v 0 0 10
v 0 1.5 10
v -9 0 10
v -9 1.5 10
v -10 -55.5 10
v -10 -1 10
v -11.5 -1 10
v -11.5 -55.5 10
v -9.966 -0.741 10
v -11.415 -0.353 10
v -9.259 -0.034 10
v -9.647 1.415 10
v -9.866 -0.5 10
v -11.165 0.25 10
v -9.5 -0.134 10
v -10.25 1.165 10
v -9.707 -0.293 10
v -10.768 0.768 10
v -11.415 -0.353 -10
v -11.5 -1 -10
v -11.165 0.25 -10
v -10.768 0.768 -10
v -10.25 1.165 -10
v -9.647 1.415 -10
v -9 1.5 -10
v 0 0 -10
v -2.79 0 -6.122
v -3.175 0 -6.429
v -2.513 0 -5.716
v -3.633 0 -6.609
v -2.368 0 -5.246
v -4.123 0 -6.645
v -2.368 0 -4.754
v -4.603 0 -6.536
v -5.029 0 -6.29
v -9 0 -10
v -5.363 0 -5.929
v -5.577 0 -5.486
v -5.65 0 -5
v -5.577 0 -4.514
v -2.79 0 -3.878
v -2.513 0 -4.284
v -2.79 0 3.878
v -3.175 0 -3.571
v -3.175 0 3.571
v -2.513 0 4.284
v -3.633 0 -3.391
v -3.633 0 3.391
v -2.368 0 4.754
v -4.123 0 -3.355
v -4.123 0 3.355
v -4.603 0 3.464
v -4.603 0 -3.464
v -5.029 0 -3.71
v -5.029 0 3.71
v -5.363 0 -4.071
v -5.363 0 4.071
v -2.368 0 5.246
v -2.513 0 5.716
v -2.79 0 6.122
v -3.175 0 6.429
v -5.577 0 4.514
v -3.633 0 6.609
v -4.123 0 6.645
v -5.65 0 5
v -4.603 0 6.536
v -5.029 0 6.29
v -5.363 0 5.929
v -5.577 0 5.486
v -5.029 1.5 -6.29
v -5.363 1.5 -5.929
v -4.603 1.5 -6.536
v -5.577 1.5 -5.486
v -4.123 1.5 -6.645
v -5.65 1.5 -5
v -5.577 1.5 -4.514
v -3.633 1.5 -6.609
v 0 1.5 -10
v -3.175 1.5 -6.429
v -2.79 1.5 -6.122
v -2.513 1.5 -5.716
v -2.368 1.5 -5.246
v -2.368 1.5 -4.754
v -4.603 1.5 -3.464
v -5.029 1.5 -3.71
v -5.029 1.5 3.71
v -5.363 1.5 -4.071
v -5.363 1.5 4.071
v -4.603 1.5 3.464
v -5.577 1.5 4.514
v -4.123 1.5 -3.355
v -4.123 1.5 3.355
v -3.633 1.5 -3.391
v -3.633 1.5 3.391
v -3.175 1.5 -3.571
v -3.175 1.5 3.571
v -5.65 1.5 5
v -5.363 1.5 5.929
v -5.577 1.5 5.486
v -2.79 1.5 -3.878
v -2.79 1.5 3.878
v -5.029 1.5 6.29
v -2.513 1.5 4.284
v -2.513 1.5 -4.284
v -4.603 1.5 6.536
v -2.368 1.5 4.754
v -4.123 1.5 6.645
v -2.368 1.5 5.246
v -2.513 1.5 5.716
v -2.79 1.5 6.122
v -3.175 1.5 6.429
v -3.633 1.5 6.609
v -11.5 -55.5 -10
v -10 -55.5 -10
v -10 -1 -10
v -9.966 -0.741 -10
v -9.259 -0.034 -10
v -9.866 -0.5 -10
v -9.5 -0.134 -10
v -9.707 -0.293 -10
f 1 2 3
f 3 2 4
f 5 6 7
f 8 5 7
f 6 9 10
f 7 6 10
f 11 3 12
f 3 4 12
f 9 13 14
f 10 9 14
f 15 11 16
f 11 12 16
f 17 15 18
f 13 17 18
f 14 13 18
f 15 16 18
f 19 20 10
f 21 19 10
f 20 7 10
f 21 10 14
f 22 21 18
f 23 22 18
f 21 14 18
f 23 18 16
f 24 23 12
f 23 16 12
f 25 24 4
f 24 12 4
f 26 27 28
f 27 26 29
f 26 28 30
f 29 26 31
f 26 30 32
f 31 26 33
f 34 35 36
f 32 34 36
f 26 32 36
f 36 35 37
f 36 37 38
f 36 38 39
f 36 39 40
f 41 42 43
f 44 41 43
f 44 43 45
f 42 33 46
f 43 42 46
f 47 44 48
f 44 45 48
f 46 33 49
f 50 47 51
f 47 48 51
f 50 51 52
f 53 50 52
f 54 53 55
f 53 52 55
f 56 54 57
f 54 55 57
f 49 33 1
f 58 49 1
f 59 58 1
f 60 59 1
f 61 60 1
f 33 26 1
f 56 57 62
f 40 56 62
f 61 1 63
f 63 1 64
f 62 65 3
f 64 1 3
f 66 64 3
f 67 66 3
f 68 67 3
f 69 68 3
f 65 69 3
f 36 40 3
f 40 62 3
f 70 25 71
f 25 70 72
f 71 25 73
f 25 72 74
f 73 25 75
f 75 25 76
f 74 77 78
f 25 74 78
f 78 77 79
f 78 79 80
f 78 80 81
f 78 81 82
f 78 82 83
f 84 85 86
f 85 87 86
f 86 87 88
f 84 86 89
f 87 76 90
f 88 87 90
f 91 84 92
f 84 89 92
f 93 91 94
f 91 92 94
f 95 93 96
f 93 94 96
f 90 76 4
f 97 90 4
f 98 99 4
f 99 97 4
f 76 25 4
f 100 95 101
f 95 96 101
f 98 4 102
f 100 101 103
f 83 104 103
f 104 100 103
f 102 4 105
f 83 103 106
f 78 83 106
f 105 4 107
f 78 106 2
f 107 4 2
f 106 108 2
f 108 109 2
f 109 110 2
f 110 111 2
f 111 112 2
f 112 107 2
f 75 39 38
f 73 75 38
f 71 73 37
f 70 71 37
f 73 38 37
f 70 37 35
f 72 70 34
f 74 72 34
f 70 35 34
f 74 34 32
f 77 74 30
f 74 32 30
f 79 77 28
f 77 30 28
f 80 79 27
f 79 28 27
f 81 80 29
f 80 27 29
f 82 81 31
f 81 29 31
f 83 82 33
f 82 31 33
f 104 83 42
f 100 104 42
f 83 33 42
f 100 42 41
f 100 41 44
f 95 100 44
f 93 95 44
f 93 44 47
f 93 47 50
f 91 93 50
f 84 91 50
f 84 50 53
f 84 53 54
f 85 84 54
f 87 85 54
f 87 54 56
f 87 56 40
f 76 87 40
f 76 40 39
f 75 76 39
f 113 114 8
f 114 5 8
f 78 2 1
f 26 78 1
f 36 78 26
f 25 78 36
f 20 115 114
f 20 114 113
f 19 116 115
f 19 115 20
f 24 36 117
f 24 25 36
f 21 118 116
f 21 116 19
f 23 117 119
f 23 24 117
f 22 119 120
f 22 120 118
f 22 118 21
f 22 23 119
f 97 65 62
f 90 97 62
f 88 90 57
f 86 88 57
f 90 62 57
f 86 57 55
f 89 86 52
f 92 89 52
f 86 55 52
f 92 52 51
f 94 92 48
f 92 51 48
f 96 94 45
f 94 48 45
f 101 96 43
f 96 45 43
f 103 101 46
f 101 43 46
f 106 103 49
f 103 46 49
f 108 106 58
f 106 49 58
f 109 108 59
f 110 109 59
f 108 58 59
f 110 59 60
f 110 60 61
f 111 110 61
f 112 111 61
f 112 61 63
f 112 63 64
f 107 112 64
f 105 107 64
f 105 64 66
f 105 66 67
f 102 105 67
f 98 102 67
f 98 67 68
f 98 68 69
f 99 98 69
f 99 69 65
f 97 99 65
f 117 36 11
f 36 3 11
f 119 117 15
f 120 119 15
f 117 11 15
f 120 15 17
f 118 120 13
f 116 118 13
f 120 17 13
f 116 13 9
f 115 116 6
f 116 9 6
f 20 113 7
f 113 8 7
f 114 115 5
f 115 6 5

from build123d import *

# Parameters (mm, degrees)
SM_BASE_FLANGE_1_DEPTH = 10
HOLE_WIZARD_M4_1_D     = 3.3


# Sheet-metal steps are written as plain solids
with BuildPart() as part:
    # Sketch 1 → 基体-法兰1 (new, symmetric)
    with BuildSketch(Plane.XY):
        with BuildLine():
            Line((0, 0), (-9, 0))
            ThreePointArc((-9, 0), (-9.707106781, -0.292893219), (-10, -1))
            Line((-10, -1), (-10, -55.5))
            Line((-10, -55.5), (-11.5, -55.5))
            Line((-11.5, -55.5), (-11.5, -1))
            ThreePointArc((-11.5, -1), (-10.767766953, 0.767766953), (-9, 1.5))
            Line((-9, 1.5), (0, 1.5))
            Line((0, 1.5), (0, 0))
        make_face()
    extrude(amount=SM_BASE_FLANGE_1_DEPTH, both=True)

    # M4 螺纹孔1 (through all)
    with Locations(Plane(origin=(0, 1.5, 0), x_dir=(1, 0, 0), z_dir=(0, 1, 0))):
        with Locations((-4, 5), (-4, -5)):
            Hole(HOLE_WIZARD_M4_1_D / 2)


solid = part.part
